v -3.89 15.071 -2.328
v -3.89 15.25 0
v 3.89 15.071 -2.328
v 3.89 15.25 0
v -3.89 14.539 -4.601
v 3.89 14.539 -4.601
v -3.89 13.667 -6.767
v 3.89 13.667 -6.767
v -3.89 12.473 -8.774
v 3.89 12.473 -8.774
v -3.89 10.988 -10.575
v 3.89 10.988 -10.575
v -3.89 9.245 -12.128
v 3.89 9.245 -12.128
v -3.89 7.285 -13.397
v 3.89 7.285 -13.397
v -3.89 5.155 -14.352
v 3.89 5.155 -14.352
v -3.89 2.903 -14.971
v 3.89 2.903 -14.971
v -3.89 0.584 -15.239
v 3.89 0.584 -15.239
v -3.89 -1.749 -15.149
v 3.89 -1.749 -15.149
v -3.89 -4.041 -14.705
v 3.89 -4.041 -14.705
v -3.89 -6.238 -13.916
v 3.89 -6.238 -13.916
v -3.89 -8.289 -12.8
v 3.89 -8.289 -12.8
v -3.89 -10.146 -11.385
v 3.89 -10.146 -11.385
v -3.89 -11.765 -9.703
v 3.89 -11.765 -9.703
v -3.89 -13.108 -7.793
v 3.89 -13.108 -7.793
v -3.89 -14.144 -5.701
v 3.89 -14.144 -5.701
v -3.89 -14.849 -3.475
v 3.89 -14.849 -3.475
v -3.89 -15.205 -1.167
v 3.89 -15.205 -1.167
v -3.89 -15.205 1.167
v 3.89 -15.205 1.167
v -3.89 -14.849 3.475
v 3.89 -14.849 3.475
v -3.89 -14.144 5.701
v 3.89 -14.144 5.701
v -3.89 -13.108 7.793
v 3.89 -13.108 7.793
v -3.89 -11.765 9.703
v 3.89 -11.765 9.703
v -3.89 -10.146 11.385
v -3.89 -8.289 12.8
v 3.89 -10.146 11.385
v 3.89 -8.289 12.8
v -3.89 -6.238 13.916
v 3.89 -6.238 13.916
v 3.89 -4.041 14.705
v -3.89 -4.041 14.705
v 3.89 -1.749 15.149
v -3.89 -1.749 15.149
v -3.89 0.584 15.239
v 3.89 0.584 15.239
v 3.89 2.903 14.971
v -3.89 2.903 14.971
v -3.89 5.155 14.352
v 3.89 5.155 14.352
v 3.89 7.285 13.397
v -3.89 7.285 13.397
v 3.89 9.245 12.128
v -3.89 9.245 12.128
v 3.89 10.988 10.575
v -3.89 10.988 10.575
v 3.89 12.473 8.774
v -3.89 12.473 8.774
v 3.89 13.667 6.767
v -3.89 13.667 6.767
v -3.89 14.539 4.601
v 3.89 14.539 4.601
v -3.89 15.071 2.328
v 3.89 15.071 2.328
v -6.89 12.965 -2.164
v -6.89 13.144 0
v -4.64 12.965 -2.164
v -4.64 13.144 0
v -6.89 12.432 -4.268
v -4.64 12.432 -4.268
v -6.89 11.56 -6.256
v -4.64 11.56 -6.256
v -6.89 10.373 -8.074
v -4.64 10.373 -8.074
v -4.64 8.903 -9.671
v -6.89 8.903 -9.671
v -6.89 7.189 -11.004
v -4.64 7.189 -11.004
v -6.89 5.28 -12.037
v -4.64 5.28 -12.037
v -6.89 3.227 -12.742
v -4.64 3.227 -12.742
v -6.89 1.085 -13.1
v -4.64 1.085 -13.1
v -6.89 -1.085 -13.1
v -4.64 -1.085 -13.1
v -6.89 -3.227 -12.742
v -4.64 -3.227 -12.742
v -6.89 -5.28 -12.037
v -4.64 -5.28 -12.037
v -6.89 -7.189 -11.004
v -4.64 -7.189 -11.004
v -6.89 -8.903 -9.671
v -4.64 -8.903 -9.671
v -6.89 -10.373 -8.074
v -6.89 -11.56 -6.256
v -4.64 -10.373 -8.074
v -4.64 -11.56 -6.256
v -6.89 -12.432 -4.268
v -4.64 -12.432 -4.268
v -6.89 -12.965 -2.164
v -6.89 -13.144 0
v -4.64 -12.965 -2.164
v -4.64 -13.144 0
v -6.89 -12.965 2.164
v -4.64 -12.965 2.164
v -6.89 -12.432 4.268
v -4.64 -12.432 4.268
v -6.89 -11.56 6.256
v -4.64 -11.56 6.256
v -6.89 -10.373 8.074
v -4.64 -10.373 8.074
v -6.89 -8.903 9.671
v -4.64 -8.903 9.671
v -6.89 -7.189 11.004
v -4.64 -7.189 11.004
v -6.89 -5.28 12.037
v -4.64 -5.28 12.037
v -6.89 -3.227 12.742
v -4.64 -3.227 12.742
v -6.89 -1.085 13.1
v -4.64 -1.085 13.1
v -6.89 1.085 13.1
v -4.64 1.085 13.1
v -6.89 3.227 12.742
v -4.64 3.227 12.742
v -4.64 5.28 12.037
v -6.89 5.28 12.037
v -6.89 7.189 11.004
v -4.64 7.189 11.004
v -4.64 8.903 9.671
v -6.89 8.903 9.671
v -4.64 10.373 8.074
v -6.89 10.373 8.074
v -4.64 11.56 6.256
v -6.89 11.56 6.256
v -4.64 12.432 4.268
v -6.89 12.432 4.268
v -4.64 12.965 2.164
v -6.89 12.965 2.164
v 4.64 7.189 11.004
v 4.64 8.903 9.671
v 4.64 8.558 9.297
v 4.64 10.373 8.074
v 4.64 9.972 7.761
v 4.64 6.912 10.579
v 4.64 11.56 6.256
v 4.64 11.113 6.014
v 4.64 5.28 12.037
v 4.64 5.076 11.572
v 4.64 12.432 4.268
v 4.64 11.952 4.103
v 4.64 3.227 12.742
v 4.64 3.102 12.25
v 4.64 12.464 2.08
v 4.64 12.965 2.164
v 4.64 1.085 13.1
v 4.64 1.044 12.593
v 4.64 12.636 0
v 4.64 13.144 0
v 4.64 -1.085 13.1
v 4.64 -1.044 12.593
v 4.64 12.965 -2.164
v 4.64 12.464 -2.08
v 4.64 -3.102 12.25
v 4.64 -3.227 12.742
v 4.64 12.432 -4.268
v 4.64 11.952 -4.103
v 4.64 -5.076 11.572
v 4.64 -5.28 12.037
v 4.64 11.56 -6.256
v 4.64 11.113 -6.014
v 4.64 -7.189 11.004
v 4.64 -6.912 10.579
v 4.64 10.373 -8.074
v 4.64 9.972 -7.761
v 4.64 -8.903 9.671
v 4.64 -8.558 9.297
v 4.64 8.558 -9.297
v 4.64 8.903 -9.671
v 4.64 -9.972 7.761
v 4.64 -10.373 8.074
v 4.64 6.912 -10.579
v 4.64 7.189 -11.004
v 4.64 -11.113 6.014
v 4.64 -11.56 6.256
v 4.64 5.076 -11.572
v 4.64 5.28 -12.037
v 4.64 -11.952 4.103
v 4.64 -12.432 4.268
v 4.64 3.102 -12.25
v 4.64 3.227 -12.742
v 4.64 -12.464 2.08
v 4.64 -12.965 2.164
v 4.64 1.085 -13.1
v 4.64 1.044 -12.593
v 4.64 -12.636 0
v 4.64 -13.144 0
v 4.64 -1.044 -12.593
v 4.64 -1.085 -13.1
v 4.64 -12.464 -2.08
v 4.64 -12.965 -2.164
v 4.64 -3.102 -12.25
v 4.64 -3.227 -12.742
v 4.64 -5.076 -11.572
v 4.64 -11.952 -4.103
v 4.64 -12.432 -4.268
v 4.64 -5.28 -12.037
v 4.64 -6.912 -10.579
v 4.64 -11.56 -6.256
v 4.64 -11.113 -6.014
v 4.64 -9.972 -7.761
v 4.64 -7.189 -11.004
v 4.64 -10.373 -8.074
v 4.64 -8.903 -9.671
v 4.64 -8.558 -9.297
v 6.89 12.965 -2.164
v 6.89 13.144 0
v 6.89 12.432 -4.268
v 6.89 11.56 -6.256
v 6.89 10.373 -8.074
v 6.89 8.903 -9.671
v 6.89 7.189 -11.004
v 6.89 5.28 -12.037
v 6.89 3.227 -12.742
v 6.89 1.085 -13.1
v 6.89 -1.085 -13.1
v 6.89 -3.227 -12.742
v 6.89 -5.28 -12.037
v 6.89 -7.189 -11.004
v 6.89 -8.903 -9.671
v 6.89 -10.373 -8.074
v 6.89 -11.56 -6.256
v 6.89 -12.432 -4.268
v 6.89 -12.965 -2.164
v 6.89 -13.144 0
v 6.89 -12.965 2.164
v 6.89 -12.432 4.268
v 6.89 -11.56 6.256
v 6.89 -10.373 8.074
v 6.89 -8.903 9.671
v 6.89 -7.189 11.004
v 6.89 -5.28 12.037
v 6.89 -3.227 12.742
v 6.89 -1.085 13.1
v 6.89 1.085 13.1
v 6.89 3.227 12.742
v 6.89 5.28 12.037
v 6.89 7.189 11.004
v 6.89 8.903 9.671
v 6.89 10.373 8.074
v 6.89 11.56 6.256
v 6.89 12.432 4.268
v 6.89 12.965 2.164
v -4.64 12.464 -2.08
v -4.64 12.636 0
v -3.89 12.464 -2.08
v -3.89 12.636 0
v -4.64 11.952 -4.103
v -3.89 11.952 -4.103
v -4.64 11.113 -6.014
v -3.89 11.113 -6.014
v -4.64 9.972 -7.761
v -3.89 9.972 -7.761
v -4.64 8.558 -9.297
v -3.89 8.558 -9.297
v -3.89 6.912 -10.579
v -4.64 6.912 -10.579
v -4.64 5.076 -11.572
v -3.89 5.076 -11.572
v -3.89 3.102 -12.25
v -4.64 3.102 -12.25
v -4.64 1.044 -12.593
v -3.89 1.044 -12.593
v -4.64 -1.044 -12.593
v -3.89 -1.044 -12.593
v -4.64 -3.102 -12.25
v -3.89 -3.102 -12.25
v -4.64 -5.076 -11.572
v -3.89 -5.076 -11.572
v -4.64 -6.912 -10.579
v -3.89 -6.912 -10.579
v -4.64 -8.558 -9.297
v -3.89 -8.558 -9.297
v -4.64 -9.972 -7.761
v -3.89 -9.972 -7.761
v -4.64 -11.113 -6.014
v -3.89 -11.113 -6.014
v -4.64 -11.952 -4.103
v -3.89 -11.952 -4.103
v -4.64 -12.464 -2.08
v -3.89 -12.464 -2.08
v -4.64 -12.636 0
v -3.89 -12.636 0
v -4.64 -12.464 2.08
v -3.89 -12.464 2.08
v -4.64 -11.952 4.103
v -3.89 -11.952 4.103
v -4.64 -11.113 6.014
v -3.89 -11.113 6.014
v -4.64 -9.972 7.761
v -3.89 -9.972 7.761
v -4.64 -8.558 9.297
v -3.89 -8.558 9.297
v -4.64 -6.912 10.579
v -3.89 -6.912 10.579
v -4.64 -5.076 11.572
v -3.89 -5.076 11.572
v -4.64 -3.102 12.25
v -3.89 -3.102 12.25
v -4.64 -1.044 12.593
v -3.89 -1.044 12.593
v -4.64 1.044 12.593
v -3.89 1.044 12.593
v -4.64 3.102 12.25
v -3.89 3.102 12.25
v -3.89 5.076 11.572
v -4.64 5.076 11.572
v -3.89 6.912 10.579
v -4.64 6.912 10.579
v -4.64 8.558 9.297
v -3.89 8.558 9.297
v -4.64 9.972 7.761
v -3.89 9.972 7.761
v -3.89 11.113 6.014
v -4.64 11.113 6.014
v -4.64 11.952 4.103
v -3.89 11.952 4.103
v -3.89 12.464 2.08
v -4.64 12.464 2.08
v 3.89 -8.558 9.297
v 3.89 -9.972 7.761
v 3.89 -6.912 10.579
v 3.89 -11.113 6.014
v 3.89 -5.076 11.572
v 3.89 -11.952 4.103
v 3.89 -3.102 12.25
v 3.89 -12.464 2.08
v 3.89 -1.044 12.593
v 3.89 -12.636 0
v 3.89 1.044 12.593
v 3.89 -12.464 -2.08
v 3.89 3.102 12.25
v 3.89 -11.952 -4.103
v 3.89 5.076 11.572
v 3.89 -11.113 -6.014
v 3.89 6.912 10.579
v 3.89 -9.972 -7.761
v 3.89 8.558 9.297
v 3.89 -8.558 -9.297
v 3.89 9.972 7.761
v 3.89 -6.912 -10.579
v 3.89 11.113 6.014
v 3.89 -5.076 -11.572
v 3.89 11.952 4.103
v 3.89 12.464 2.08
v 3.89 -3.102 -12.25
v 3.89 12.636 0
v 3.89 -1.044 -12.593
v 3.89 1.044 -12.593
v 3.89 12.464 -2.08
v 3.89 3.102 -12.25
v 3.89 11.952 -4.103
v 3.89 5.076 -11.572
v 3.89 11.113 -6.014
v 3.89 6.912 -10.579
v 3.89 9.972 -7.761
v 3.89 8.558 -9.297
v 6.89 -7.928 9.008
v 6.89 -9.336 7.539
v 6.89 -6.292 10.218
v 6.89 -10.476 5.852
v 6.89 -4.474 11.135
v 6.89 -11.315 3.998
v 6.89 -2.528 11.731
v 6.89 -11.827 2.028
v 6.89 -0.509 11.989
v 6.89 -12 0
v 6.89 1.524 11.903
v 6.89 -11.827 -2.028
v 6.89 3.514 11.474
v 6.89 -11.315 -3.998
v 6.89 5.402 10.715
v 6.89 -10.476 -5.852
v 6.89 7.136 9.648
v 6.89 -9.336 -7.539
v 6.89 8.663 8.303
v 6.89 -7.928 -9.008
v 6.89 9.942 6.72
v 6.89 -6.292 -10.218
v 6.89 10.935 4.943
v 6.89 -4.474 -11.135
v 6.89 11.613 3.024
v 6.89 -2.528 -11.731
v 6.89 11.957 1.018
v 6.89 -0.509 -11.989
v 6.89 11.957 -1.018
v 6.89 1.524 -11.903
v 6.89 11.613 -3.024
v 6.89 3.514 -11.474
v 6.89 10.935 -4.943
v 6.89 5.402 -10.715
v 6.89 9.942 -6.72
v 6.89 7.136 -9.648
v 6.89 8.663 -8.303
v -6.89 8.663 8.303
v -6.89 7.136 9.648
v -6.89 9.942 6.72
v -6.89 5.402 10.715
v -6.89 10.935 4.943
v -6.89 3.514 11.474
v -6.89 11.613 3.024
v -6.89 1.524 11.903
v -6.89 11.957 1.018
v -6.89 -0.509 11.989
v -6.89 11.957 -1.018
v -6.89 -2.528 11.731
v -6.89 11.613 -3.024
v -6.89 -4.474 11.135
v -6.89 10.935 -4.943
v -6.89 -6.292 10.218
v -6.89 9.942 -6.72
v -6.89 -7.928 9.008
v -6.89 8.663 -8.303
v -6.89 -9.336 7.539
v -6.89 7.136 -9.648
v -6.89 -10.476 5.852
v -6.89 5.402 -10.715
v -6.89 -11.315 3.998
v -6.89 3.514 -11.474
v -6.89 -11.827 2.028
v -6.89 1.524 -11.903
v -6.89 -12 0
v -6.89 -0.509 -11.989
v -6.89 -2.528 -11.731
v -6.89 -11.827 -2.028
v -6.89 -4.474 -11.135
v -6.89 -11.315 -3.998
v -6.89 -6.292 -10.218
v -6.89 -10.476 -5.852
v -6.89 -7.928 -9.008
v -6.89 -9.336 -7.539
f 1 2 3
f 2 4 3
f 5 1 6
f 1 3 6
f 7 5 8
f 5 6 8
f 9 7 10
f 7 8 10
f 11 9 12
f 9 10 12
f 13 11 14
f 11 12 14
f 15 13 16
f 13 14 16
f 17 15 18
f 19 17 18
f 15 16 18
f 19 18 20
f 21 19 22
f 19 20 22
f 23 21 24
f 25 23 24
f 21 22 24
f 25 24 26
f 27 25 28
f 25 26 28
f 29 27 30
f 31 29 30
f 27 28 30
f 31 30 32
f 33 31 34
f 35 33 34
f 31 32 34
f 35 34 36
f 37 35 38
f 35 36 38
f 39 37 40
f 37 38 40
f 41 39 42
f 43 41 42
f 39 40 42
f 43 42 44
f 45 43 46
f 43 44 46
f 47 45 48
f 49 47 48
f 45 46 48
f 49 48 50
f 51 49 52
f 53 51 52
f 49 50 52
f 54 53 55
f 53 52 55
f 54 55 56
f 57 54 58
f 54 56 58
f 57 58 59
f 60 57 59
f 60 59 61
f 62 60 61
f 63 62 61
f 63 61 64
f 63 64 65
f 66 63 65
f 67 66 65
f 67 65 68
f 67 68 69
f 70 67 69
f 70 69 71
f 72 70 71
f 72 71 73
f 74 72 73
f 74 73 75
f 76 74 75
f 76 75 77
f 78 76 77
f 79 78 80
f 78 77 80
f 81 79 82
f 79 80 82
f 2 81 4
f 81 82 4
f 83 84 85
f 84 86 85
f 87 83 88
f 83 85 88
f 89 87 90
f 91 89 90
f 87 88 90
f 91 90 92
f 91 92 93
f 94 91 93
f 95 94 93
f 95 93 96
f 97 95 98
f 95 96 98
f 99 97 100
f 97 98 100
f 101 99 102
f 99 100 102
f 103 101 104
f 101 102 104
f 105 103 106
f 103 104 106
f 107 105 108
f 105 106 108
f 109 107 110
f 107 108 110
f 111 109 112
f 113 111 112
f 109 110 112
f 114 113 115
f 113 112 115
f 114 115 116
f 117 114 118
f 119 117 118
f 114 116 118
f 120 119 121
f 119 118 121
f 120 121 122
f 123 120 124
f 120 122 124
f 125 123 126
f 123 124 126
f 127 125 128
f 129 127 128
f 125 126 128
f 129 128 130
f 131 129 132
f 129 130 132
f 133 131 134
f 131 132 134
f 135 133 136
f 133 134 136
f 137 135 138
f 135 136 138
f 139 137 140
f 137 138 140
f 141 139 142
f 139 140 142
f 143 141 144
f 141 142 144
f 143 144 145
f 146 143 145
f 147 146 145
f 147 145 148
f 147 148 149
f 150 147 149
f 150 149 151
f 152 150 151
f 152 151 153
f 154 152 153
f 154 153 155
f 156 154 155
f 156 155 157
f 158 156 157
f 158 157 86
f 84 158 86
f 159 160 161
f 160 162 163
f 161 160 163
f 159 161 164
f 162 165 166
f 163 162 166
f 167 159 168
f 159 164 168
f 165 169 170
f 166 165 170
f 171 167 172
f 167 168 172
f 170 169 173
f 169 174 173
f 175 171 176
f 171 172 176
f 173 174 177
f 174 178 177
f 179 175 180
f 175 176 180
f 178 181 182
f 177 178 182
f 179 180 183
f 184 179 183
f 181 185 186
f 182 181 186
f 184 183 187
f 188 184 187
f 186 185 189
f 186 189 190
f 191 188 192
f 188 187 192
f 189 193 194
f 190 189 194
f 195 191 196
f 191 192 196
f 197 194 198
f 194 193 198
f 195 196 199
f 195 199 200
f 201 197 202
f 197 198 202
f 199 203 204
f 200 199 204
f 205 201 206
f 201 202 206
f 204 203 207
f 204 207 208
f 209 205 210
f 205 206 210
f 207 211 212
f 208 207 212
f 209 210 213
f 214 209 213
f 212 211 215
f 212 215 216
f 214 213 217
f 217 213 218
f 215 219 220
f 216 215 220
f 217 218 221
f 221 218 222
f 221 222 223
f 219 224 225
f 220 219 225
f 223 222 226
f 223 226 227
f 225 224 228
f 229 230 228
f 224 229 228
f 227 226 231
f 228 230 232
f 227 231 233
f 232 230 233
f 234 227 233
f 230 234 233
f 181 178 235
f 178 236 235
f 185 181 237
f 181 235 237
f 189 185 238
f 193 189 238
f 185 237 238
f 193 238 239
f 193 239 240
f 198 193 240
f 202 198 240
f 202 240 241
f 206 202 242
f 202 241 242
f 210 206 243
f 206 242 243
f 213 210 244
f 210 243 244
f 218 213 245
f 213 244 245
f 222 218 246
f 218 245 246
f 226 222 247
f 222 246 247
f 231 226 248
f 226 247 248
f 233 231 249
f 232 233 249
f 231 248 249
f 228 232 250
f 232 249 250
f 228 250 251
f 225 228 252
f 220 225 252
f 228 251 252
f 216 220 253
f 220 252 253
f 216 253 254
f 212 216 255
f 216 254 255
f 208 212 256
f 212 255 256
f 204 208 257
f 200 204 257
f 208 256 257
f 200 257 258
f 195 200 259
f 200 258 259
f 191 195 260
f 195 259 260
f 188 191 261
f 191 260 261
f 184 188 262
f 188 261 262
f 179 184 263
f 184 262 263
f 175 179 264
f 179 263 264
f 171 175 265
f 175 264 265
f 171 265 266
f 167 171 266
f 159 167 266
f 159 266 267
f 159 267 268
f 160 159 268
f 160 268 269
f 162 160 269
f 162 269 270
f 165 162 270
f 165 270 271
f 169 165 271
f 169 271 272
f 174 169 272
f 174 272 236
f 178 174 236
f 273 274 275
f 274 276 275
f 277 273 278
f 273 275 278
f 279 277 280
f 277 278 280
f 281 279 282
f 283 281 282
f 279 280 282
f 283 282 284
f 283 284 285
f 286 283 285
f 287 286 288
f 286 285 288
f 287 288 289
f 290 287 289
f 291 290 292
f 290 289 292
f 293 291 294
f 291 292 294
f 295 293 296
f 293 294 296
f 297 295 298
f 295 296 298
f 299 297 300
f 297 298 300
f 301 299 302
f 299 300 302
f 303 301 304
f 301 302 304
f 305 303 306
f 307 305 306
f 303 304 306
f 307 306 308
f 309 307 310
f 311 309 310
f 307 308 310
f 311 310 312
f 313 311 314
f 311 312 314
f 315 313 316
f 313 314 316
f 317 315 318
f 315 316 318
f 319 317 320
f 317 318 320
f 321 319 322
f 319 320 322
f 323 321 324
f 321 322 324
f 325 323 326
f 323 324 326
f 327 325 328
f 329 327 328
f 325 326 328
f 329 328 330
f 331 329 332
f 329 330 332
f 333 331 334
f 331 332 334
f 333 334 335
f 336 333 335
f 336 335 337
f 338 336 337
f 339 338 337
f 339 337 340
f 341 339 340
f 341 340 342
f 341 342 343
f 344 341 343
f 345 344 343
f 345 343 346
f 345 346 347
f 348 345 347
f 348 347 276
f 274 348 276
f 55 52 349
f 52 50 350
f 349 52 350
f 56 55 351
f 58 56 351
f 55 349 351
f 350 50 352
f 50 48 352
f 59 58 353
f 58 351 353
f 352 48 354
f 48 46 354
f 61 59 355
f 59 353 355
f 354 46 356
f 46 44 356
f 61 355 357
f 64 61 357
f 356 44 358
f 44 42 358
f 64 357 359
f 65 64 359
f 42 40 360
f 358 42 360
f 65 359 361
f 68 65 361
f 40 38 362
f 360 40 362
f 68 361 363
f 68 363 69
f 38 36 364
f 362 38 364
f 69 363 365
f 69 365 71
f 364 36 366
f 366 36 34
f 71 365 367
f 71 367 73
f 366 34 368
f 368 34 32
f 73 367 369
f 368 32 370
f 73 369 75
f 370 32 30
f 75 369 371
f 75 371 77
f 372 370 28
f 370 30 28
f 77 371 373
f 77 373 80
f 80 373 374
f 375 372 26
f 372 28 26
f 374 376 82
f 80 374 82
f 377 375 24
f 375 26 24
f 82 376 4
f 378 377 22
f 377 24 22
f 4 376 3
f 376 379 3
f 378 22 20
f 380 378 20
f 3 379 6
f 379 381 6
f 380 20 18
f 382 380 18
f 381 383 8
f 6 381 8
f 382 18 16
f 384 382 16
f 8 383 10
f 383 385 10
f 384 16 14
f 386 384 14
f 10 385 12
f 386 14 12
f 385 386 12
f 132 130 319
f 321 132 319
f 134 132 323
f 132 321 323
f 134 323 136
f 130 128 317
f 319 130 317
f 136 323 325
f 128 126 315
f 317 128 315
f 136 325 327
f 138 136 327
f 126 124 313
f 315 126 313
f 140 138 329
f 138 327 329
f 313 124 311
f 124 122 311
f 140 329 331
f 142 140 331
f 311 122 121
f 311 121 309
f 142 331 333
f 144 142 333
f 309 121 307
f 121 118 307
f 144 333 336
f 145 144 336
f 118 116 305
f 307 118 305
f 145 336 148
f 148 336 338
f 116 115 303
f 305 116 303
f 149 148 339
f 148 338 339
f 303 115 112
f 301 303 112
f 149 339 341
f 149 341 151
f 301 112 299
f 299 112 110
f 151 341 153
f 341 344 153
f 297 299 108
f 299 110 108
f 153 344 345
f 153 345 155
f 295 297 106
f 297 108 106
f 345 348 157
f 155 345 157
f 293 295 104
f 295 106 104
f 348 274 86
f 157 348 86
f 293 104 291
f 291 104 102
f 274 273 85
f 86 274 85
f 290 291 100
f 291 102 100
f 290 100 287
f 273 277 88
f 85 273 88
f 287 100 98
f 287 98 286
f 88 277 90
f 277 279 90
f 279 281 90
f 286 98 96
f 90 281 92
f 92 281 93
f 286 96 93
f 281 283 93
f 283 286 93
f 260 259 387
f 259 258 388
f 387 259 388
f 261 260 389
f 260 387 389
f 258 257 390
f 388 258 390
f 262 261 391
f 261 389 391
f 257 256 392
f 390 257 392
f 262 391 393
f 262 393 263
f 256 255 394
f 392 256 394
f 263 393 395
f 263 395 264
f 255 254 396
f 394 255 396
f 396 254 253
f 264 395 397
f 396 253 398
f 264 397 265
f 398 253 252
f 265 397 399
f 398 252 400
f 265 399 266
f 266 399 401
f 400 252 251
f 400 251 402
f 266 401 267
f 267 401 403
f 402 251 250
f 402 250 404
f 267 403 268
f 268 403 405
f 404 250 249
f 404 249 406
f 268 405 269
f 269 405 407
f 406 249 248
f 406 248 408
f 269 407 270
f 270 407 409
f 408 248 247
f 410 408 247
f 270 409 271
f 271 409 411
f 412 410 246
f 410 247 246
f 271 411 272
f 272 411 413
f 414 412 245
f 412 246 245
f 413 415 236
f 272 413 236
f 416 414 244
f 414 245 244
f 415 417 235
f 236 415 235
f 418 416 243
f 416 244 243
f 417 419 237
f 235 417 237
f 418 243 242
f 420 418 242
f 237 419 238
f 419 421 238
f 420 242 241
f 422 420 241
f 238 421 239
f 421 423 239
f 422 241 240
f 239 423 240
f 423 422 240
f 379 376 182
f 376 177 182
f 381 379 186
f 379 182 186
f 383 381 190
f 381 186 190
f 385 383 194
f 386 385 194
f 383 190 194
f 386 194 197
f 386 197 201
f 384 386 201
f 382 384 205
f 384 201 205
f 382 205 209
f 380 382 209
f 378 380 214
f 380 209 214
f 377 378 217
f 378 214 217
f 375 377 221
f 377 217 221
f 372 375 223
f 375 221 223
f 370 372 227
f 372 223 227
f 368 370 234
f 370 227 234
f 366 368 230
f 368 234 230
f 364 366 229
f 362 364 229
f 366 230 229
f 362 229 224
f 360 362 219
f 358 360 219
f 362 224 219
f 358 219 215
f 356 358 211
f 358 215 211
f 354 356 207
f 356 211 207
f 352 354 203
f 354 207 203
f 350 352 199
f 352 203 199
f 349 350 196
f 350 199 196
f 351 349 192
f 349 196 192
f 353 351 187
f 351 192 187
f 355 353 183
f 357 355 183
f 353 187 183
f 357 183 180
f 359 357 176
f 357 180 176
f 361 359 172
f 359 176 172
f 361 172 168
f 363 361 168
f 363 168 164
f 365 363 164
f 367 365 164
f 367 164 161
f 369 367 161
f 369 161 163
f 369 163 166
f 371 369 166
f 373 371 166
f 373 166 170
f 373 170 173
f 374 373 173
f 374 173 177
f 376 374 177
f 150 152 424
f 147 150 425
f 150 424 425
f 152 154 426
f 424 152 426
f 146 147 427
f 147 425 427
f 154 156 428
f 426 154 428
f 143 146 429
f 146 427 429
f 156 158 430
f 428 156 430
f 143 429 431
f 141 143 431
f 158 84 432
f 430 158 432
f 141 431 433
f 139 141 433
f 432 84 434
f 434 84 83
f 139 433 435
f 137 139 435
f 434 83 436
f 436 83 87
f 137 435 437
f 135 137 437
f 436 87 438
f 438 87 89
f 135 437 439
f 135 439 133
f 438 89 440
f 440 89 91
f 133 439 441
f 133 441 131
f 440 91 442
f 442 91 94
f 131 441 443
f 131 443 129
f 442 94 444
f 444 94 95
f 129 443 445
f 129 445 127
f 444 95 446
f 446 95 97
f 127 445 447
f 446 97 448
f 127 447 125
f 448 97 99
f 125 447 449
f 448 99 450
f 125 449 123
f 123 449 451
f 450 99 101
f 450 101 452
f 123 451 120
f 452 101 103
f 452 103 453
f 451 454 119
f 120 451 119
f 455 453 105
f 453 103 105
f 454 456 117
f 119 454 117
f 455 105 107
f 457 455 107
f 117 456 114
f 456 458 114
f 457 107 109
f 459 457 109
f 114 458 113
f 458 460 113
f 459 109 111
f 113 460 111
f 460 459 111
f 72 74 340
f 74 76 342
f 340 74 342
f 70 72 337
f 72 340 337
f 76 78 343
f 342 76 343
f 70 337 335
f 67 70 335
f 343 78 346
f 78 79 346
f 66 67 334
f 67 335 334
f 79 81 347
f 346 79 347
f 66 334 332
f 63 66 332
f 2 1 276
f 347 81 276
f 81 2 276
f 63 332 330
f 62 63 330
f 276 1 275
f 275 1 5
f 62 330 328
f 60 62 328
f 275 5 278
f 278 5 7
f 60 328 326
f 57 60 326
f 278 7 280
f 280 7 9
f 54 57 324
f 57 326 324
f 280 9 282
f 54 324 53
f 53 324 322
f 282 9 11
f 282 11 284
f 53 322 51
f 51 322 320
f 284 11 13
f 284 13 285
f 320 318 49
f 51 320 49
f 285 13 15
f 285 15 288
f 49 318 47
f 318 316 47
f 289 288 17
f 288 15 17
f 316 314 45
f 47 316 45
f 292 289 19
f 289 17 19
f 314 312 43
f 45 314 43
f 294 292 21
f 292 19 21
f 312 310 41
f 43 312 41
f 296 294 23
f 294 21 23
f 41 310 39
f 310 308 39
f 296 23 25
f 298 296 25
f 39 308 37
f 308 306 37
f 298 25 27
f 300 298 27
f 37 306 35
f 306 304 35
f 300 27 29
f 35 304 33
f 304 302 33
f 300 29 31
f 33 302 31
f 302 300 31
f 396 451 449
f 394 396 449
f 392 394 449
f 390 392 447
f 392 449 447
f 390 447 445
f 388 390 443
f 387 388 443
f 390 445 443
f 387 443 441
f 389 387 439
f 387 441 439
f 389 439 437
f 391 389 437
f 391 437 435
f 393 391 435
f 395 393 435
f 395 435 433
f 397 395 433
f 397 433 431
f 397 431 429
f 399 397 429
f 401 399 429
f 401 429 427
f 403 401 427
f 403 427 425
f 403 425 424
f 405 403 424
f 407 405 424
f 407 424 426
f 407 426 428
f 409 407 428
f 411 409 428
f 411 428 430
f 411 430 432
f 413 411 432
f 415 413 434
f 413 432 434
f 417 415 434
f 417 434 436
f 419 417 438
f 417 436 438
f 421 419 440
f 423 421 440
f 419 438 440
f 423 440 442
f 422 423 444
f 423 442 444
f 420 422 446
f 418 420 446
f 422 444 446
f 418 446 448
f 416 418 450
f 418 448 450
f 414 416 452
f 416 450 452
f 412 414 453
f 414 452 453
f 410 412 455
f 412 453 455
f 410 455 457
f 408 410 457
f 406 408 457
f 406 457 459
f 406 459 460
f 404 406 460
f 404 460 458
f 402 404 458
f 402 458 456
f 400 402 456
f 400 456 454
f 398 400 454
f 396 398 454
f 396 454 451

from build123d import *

# Parameters (mm, degrees)
SKETCH3_R          = 12
CUT_EXTRUDE1_DEPTH = 26.593229573


with BuildPart() as part:
    # Sketch2 → Revolve1 (revolve)
    with BuildSketch(Plane.XY):
        Polygon((6.89, 0), (-6.89, 0), (-6.89, 13.1445), (-4.64, 13.1445), (-4.64, 12.6365), (-3.89, 12.6365), (-3.89, 15.25), (3.89, 15.25), (3.89, 12.6365), (4.64, 12.6365), (4.64, 13.1445), (6.89, 13.1445), align=None)
    revolve(axis=Axis((6.89, 0, 0), (-1, 0, 0)))

    # Sketch3 → Cut-Extrude1 (cut, through all)
    with BuildSketch(Plane.ZY.offset(6.89)):
        with Locations(Location((0, 0, 0), (0, 0, 270))):
            Circle(SKETCH3_R)
    extrude(amount=-CUT_EXTRUDE1_DEPTH, mode=Mode.SUBTRACT)


solid = part.part
